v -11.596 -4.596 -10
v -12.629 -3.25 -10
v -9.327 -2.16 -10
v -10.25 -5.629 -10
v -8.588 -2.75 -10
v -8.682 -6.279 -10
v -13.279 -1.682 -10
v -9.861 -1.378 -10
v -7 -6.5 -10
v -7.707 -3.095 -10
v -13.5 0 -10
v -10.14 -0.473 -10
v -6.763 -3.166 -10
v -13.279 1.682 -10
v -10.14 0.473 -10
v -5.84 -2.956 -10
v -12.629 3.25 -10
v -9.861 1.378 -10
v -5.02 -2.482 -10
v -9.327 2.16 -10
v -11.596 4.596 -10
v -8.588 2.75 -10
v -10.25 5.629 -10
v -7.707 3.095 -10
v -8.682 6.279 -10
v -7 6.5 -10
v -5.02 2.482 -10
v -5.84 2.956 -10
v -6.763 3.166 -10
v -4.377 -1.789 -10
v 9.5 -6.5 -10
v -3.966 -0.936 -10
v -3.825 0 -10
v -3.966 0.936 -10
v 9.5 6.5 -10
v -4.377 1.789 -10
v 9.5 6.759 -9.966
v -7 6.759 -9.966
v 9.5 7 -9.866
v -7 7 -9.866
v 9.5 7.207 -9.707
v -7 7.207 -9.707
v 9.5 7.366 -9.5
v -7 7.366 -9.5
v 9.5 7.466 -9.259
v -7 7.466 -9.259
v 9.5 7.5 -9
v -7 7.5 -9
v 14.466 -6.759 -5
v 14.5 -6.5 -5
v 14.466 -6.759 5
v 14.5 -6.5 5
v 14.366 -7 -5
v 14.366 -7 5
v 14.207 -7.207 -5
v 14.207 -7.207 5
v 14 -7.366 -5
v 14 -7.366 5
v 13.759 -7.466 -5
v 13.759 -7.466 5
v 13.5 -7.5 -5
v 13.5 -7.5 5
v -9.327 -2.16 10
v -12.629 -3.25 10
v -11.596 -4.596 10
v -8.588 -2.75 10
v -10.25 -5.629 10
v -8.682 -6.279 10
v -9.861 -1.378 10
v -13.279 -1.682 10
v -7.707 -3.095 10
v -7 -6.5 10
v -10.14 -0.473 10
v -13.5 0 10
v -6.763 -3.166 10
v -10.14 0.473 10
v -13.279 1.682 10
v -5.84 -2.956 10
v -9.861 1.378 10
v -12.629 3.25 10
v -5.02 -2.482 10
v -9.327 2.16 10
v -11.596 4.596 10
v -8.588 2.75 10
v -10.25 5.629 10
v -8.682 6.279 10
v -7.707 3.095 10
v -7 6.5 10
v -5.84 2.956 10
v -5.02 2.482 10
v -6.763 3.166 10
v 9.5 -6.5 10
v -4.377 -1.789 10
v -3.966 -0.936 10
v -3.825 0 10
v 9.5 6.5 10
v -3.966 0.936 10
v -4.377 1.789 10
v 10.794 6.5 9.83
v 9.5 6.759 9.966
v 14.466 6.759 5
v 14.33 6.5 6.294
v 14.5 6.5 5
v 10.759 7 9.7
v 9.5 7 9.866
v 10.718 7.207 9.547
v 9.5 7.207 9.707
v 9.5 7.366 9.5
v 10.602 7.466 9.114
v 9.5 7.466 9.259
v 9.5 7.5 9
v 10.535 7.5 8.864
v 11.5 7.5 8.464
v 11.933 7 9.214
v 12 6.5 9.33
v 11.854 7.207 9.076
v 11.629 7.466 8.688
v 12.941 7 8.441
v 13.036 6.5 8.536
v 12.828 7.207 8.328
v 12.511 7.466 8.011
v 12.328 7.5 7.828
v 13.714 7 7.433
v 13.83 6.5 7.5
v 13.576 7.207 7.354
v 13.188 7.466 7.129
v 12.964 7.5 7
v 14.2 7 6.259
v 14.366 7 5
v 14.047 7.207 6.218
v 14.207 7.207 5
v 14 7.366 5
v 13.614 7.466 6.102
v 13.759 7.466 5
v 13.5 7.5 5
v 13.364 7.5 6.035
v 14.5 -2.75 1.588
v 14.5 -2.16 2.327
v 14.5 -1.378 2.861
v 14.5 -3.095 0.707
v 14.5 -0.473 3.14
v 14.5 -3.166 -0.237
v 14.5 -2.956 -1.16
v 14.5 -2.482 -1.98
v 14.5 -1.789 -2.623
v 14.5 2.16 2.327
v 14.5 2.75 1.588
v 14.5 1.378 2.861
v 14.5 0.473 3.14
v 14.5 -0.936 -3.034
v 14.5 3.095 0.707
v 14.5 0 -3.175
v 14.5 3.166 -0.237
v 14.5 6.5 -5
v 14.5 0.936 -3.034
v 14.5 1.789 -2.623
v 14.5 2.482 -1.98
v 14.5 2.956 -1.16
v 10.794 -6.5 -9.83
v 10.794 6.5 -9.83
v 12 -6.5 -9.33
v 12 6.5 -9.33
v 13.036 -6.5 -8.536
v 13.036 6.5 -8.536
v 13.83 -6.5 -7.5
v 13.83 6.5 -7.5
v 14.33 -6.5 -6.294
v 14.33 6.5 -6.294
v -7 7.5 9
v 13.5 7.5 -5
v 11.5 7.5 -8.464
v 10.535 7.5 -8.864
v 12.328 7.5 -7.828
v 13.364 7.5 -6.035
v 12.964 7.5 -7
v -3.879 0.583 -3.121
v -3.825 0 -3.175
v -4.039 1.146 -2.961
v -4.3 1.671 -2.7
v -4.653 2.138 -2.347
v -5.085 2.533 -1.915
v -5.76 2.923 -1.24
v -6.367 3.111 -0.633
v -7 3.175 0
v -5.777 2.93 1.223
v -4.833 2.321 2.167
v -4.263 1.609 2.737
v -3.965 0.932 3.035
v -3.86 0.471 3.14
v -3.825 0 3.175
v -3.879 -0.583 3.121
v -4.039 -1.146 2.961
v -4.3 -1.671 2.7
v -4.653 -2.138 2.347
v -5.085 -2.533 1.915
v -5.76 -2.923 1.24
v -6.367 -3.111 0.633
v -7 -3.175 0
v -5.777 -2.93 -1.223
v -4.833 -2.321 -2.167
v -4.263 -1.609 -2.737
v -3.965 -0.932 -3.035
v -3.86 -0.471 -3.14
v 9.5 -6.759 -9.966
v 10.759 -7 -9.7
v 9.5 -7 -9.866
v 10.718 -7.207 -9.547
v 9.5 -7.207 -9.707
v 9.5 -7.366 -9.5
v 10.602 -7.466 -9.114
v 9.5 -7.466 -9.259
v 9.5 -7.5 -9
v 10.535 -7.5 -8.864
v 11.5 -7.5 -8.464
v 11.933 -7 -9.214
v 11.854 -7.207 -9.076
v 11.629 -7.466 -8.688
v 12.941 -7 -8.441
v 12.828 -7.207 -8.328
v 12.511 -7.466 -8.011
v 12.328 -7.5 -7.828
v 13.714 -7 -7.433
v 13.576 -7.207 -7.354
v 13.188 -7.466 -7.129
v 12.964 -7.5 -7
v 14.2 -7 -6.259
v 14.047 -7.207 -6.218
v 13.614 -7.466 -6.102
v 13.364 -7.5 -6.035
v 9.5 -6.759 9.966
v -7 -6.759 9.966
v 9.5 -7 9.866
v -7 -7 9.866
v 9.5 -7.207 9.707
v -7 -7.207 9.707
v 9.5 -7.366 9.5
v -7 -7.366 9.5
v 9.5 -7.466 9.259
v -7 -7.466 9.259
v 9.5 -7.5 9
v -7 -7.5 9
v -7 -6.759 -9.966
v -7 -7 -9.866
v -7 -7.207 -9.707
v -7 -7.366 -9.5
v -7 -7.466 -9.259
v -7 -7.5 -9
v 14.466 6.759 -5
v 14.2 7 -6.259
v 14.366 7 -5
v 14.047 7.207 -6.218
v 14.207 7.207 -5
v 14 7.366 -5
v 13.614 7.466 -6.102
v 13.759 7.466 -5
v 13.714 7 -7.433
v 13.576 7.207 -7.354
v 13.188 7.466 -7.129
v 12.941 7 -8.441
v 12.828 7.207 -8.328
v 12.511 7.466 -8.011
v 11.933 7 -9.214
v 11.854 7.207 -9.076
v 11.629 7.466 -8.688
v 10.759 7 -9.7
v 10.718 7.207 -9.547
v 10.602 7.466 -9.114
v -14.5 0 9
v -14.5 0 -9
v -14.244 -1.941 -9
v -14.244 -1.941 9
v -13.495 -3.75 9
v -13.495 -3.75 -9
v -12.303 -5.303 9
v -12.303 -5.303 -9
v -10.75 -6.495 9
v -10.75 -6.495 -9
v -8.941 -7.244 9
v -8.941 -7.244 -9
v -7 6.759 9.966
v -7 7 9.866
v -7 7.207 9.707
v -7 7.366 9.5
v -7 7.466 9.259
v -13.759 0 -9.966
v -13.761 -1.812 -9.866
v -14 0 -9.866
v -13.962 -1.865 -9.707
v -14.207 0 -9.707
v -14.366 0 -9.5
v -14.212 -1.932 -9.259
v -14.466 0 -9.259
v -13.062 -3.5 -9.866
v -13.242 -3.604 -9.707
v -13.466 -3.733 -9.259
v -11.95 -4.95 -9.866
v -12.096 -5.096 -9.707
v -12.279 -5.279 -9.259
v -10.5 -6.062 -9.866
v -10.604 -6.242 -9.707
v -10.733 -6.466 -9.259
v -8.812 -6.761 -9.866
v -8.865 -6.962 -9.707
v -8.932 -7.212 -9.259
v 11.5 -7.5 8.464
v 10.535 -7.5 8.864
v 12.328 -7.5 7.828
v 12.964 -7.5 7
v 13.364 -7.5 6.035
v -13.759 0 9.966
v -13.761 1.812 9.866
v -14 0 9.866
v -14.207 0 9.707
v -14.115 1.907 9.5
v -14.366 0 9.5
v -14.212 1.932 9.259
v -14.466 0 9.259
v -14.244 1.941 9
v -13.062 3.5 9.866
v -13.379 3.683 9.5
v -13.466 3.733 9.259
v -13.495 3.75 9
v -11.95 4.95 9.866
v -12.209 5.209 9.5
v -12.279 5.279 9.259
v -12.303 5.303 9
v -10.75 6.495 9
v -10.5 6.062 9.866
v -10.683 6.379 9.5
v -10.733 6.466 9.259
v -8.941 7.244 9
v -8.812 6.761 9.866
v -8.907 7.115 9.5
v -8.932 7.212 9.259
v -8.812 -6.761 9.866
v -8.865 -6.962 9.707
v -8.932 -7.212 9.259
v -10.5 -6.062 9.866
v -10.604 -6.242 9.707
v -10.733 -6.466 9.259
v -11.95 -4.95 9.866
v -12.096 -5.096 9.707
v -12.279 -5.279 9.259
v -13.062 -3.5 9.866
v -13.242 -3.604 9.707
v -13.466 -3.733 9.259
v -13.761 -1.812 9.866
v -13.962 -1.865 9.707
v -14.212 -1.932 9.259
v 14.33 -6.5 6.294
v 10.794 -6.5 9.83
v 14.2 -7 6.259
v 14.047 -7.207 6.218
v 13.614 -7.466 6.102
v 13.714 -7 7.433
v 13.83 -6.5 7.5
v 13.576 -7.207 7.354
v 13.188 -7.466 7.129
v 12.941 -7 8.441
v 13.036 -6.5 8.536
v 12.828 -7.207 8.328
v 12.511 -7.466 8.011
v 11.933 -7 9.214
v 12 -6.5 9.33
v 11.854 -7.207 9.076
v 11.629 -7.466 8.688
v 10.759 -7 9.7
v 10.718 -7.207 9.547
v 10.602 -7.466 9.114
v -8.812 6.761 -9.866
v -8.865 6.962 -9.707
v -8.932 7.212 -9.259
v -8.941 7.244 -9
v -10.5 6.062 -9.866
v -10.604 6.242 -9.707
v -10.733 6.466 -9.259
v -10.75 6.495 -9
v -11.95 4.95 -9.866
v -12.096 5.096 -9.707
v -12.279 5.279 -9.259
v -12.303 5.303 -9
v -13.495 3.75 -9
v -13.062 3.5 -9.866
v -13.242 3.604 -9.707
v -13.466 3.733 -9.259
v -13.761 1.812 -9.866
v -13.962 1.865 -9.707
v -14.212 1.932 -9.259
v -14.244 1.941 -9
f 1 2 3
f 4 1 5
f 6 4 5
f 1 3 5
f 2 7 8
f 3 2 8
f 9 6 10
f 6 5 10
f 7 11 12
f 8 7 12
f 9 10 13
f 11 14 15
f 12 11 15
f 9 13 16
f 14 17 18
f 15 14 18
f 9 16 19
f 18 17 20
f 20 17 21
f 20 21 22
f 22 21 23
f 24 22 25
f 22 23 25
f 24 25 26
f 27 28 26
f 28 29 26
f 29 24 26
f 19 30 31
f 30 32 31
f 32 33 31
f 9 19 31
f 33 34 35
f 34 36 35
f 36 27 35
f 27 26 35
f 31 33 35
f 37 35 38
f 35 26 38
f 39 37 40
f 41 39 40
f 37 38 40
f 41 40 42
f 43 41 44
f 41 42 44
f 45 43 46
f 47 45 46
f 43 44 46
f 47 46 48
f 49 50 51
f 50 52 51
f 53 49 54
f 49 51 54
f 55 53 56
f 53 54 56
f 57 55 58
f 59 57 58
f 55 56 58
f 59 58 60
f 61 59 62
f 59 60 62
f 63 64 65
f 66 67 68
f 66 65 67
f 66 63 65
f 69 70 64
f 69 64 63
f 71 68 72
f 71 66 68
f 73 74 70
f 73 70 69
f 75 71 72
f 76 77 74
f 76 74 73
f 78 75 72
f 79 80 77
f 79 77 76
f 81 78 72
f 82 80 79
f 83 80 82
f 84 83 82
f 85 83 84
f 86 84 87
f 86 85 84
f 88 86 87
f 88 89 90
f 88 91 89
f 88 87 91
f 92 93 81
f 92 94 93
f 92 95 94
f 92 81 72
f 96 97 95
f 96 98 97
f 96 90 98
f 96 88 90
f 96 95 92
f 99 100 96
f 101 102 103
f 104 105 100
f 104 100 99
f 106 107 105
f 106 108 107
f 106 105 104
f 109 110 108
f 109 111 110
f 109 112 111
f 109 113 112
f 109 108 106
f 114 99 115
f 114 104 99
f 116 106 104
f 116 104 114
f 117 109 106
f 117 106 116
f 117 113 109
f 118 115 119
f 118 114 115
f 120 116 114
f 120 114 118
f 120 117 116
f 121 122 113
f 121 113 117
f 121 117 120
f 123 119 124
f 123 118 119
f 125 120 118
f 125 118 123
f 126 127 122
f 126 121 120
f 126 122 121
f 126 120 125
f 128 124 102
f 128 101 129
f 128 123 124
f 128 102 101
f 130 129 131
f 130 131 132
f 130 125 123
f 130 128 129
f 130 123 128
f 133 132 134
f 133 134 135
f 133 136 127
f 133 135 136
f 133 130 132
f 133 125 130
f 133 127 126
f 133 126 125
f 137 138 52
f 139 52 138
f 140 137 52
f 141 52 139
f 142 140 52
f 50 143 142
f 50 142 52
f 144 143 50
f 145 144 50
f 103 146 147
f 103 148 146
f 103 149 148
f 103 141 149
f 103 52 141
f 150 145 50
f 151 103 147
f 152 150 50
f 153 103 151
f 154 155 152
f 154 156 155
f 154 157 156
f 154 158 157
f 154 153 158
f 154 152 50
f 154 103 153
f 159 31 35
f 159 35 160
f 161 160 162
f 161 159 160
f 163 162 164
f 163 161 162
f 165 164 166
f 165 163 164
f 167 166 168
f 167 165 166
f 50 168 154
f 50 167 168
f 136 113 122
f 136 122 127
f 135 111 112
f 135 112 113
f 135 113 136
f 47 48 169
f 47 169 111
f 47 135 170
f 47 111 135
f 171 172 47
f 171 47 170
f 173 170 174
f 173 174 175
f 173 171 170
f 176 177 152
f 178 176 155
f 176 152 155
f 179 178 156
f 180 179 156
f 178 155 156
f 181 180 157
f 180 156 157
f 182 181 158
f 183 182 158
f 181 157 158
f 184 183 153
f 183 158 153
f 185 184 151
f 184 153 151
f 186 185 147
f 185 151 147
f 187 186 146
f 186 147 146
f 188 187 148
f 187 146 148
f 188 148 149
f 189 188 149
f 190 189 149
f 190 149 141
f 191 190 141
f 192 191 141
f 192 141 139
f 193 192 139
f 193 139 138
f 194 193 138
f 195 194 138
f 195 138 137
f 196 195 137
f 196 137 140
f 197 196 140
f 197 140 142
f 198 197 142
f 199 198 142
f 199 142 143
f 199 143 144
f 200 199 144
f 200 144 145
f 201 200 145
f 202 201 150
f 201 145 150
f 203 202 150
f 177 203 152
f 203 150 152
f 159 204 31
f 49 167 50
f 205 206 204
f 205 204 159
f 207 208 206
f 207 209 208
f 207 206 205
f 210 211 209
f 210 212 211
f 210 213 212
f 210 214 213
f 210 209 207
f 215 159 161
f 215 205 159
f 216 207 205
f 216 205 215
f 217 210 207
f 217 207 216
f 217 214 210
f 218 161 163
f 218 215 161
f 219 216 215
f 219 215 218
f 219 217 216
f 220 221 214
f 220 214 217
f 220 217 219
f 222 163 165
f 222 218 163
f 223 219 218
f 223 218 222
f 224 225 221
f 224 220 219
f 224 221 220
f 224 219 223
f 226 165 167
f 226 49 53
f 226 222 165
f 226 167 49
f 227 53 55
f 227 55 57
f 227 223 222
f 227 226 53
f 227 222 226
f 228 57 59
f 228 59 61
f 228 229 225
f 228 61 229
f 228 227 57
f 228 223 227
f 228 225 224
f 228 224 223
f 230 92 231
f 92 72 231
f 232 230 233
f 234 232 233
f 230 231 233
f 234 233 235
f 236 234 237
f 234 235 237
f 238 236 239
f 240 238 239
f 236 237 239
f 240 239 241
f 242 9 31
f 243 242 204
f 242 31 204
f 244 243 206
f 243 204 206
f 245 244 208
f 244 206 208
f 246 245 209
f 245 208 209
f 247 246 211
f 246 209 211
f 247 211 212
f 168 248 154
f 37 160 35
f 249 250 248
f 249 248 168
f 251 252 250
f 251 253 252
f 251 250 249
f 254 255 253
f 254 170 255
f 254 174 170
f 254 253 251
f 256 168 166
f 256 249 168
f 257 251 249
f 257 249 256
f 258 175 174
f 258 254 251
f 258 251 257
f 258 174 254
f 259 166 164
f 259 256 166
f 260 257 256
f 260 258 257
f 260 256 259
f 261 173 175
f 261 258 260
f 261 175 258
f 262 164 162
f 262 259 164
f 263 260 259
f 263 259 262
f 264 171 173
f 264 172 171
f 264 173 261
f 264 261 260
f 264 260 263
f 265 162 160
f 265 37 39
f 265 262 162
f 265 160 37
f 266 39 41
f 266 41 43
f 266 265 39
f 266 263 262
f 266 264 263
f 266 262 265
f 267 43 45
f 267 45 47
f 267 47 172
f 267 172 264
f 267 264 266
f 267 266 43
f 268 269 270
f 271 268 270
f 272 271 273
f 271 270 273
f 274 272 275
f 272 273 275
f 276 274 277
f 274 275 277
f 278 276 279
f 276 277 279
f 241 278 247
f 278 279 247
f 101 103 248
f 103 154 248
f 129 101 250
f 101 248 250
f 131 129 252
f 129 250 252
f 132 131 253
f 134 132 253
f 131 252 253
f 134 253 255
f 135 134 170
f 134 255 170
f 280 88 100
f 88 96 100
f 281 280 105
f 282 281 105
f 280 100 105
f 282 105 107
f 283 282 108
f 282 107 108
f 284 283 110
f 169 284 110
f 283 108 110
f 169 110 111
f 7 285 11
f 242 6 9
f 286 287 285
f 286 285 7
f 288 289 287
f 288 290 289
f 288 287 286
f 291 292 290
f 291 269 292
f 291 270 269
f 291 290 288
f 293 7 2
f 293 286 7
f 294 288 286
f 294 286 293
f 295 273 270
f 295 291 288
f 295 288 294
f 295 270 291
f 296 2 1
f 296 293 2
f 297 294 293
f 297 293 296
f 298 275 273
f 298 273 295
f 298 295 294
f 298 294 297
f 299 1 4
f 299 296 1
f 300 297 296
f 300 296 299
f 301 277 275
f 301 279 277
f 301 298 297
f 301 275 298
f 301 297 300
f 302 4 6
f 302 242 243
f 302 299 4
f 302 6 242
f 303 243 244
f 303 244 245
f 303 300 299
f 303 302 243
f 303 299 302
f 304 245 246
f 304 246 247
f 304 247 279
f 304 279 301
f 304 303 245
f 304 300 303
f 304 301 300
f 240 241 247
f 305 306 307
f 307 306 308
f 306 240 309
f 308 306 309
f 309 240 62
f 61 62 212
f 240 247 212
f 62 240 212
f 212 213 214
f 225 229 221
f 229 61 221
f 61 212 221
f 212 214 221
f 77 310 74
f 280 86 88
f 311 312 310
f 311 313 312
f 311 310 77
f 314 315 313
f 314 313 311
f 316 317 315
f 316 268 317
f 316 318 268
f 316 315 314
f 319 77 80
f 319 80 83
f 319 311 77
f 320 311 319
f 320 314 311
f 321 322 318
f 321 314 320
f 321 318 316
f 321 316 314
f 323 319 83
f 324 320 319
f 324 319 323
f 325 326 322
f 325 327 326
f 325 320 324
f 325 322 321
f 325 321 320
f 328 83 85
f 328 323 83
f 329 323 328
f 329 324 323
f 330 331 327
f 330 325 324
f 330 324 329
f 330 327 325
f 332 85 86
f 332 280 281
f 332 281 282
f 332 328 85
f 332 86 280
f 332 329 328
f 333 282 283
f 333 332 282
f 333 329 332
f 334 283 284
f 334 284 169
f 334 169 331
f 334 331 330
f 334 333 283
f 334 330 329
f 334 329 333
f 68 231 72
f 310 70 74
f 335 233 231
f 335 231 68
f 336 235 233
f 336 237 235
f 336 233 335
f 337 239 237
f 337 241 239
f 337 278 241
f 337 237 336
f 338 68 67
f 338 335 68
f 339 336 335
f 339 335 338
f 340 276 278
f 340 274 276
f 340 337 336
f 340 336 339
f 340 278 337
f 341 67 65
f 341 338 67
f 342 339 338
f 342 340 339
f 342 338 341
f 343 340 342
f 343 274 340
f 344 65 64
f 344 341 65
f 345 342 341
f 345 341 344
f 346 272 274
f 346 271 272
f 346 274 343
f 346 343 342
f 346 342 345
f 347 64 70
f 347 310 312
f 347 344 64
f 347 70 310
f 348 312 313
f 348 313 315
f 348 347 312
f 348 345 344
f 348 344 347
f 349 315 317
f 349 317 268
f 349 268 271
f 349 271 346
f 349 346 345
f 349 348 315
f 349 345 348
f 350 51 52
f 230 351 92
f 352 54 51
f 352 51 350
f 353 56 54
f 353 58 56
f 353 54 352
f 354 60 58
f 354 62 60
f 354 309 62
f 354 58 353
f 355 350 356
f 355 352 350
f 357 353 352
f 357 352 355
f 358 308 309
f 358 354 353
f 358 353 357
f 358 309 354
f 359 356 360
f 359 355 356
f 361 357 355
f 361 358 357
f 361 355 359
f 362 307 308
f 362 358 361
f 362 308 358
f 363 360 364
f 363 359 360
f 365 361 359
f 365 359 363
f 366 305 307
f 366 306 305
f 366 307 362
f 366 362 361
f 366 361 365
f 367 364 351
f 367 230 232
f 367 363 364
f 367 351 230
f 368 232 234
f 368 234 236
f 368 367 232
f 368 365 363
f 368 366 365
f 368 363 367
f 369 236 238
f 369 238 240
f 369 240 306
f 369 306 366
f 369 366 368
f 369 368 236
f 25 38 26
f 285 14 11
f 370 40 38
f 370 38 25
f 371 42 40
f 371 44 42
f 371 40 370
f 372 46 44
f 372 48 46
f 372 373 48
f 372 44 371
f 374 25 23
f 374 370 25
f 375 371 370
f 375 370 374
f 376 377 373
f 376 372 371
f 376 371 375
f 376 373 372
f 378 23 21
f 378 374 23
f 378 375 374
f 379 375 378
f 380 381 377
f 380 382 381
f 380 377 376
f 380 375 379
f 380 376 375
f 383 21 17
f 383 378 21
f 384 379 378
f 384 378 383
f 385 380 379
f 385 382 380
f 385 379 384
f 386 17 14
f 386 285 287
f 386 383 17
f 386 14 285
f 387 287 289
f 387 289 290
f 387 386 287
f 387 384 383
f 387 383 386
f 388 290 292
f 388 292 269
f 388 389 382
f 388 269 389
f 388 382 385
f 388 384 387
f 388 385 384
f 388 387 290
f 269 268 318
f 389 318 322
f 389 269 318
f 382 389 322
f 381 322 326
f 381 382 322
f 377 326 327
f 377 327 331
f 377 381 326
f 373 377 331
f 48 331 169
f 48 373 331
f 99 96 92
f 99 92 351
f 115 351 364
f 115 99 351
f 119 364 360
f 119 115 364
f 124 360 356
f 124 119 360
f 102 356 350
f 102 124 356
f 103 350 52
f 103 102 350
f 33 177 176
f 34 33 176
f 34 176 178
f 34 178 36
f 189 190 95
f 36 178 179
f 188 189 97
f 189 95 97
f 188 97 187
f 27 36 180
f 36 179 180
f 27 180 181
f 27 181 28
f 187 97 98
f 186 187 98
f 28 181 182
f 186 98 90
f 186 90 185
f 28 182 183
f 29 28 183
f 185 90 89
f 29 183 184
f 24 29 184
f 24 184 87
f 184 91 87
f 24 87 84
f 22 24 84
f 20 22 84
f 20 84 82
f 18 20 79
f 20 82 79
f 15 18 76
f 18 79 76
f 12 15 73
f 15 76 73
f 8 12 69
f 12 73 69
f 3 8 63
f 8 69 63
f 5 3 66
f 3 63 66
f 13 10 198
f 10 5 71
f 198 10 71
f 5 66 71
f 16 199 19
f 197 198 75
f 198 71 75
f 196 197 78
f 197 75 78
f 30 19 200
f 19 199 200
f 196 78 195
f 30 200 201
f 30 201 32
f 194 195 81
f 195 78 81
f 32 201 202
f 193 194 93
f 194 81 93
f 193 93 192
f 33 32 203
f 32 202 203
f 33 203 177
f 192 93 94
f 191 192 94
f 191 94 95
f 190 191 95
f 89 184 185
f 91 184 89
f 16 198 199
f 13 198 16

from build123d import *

# Parameters (mm, degrees)
SKETCH1_W               = 29
SKETCH1_H               = 20
BOSS_EXTRUDE1_DEPTH     = 7.5
SKETCH2_R               = 3.175
CUT_EXTRUDE1_DEPTH      = 26.816661287
FILLET2_R               = 7.5
CUT_EXTRUDE2_REACH      = 33.579
CUT_EXTRUDE2_END_RADIUS = 3.175
SKETCH3_R               = 3.175
FILLET3_R               = 5
FILLET4_R               = 1


with BuildPart() as part:
    # Sketch1 → Boss-Extrude1 (new, symmetric)
    with BuildSketch(Plane(origin=(0, 0, 0), x_dir=(1, 0, 0), z_dir=(0, 1, 0))):
        Rectangle(SKETCH1_W, SKETCH1_H)
    extrude(amount=BOSS_EXTRUDE1_DEPTH, both=True)

    # Sketch2 → Cut-Extrude1 (cut, through all)
    with BuildSketch(Plane.XY.offset(10)):
        with Locations((-7, 0)):
            Circle(SKETCH2_R)
    extrude(amount=-CUT_EXTRUDE1_DEPTH, mode=Mode.SUBTRACT)

    # Fillet2
    fillet2_edges = [part.edges().sort_by_distance(p)[0] for p in [
        (-14.5, 7.5, 0),
        (-14.5, -7.5, 0),
    ]]
    fillet(fillet2_edges, radius=FILLET2_R - 0.0001)  # a hair under: the kernel refuses the full size

    # Cut-Extrude2: up to this cylinder (the profile starts outside it)
    cut_extrude2_end = Plane(origin=(-7, 0, 0), z_dir=(0, 0, 1)) * Cylinder(CUT_EXTRUDE2_END_RADIUS, 74.508, mode=Mode.PRIVATE)
    # Sketch3 → Cut-Extrude2 (cut, up to the surface)
    with BuildSketch(Plane(origin=(14.5, 0, 0), x_dir=(0, 0, -1), z_dir=(1, 0, 0)), mode=Mode.PRIVATE) as cut_extrude2_sk1:
        Circle(SKETCH3_R)
    cut_extrude2_tool1 = extrude(cut_extrude2_sk1.sketch, amount=-CUT_EXTRUDE2_REACH, mode=Mode.PRIVATE) - cut_extrude2_end
    add(cut_extrude2_tool1.solids().sort_by_distance((14.5, 0, 0))[0], mode=Mode.SUBTRACT)

    # Fillet3
    fillet3_edges = [part.edges().sort_by_distance(p)[0] for p in [
        (14.5, 0, -10),
        (14.5, 0, 10),
    ]]
    fillet(fillet3_edges, radius=FILLET3_R)

    # Fillet4
    fillet4_edges = [part.edges().sort_by_distance(p)[0] for p in [
        (1.24995, 7.5, 10),
        (1.24995, -7.5, 10),
        (-12.303330148, -5.303330148, 10),
        (-12.303330148, 5.303330148, 10),
        (-12.303330148, -5.303330148, -10),
        (-12.303330148, 5.303330148, -10),
        (1.24995, 7.5, -10),
        (1.24995, -7.5, -10),
        (14.5, -7.5, 0),
        (13.035533906, -7.5, 8.535533906),
        (13.035533906, -7.5, -8.535533906),
        (14.5, 7.5, 0),
        (13.035533906, 7.5, 8.535533906),
        (13.035533906, 7.5, -8.535533906),
    ]]
    fillet(fillet4_edges, radius=FILLET4_R)


solid = part.part
